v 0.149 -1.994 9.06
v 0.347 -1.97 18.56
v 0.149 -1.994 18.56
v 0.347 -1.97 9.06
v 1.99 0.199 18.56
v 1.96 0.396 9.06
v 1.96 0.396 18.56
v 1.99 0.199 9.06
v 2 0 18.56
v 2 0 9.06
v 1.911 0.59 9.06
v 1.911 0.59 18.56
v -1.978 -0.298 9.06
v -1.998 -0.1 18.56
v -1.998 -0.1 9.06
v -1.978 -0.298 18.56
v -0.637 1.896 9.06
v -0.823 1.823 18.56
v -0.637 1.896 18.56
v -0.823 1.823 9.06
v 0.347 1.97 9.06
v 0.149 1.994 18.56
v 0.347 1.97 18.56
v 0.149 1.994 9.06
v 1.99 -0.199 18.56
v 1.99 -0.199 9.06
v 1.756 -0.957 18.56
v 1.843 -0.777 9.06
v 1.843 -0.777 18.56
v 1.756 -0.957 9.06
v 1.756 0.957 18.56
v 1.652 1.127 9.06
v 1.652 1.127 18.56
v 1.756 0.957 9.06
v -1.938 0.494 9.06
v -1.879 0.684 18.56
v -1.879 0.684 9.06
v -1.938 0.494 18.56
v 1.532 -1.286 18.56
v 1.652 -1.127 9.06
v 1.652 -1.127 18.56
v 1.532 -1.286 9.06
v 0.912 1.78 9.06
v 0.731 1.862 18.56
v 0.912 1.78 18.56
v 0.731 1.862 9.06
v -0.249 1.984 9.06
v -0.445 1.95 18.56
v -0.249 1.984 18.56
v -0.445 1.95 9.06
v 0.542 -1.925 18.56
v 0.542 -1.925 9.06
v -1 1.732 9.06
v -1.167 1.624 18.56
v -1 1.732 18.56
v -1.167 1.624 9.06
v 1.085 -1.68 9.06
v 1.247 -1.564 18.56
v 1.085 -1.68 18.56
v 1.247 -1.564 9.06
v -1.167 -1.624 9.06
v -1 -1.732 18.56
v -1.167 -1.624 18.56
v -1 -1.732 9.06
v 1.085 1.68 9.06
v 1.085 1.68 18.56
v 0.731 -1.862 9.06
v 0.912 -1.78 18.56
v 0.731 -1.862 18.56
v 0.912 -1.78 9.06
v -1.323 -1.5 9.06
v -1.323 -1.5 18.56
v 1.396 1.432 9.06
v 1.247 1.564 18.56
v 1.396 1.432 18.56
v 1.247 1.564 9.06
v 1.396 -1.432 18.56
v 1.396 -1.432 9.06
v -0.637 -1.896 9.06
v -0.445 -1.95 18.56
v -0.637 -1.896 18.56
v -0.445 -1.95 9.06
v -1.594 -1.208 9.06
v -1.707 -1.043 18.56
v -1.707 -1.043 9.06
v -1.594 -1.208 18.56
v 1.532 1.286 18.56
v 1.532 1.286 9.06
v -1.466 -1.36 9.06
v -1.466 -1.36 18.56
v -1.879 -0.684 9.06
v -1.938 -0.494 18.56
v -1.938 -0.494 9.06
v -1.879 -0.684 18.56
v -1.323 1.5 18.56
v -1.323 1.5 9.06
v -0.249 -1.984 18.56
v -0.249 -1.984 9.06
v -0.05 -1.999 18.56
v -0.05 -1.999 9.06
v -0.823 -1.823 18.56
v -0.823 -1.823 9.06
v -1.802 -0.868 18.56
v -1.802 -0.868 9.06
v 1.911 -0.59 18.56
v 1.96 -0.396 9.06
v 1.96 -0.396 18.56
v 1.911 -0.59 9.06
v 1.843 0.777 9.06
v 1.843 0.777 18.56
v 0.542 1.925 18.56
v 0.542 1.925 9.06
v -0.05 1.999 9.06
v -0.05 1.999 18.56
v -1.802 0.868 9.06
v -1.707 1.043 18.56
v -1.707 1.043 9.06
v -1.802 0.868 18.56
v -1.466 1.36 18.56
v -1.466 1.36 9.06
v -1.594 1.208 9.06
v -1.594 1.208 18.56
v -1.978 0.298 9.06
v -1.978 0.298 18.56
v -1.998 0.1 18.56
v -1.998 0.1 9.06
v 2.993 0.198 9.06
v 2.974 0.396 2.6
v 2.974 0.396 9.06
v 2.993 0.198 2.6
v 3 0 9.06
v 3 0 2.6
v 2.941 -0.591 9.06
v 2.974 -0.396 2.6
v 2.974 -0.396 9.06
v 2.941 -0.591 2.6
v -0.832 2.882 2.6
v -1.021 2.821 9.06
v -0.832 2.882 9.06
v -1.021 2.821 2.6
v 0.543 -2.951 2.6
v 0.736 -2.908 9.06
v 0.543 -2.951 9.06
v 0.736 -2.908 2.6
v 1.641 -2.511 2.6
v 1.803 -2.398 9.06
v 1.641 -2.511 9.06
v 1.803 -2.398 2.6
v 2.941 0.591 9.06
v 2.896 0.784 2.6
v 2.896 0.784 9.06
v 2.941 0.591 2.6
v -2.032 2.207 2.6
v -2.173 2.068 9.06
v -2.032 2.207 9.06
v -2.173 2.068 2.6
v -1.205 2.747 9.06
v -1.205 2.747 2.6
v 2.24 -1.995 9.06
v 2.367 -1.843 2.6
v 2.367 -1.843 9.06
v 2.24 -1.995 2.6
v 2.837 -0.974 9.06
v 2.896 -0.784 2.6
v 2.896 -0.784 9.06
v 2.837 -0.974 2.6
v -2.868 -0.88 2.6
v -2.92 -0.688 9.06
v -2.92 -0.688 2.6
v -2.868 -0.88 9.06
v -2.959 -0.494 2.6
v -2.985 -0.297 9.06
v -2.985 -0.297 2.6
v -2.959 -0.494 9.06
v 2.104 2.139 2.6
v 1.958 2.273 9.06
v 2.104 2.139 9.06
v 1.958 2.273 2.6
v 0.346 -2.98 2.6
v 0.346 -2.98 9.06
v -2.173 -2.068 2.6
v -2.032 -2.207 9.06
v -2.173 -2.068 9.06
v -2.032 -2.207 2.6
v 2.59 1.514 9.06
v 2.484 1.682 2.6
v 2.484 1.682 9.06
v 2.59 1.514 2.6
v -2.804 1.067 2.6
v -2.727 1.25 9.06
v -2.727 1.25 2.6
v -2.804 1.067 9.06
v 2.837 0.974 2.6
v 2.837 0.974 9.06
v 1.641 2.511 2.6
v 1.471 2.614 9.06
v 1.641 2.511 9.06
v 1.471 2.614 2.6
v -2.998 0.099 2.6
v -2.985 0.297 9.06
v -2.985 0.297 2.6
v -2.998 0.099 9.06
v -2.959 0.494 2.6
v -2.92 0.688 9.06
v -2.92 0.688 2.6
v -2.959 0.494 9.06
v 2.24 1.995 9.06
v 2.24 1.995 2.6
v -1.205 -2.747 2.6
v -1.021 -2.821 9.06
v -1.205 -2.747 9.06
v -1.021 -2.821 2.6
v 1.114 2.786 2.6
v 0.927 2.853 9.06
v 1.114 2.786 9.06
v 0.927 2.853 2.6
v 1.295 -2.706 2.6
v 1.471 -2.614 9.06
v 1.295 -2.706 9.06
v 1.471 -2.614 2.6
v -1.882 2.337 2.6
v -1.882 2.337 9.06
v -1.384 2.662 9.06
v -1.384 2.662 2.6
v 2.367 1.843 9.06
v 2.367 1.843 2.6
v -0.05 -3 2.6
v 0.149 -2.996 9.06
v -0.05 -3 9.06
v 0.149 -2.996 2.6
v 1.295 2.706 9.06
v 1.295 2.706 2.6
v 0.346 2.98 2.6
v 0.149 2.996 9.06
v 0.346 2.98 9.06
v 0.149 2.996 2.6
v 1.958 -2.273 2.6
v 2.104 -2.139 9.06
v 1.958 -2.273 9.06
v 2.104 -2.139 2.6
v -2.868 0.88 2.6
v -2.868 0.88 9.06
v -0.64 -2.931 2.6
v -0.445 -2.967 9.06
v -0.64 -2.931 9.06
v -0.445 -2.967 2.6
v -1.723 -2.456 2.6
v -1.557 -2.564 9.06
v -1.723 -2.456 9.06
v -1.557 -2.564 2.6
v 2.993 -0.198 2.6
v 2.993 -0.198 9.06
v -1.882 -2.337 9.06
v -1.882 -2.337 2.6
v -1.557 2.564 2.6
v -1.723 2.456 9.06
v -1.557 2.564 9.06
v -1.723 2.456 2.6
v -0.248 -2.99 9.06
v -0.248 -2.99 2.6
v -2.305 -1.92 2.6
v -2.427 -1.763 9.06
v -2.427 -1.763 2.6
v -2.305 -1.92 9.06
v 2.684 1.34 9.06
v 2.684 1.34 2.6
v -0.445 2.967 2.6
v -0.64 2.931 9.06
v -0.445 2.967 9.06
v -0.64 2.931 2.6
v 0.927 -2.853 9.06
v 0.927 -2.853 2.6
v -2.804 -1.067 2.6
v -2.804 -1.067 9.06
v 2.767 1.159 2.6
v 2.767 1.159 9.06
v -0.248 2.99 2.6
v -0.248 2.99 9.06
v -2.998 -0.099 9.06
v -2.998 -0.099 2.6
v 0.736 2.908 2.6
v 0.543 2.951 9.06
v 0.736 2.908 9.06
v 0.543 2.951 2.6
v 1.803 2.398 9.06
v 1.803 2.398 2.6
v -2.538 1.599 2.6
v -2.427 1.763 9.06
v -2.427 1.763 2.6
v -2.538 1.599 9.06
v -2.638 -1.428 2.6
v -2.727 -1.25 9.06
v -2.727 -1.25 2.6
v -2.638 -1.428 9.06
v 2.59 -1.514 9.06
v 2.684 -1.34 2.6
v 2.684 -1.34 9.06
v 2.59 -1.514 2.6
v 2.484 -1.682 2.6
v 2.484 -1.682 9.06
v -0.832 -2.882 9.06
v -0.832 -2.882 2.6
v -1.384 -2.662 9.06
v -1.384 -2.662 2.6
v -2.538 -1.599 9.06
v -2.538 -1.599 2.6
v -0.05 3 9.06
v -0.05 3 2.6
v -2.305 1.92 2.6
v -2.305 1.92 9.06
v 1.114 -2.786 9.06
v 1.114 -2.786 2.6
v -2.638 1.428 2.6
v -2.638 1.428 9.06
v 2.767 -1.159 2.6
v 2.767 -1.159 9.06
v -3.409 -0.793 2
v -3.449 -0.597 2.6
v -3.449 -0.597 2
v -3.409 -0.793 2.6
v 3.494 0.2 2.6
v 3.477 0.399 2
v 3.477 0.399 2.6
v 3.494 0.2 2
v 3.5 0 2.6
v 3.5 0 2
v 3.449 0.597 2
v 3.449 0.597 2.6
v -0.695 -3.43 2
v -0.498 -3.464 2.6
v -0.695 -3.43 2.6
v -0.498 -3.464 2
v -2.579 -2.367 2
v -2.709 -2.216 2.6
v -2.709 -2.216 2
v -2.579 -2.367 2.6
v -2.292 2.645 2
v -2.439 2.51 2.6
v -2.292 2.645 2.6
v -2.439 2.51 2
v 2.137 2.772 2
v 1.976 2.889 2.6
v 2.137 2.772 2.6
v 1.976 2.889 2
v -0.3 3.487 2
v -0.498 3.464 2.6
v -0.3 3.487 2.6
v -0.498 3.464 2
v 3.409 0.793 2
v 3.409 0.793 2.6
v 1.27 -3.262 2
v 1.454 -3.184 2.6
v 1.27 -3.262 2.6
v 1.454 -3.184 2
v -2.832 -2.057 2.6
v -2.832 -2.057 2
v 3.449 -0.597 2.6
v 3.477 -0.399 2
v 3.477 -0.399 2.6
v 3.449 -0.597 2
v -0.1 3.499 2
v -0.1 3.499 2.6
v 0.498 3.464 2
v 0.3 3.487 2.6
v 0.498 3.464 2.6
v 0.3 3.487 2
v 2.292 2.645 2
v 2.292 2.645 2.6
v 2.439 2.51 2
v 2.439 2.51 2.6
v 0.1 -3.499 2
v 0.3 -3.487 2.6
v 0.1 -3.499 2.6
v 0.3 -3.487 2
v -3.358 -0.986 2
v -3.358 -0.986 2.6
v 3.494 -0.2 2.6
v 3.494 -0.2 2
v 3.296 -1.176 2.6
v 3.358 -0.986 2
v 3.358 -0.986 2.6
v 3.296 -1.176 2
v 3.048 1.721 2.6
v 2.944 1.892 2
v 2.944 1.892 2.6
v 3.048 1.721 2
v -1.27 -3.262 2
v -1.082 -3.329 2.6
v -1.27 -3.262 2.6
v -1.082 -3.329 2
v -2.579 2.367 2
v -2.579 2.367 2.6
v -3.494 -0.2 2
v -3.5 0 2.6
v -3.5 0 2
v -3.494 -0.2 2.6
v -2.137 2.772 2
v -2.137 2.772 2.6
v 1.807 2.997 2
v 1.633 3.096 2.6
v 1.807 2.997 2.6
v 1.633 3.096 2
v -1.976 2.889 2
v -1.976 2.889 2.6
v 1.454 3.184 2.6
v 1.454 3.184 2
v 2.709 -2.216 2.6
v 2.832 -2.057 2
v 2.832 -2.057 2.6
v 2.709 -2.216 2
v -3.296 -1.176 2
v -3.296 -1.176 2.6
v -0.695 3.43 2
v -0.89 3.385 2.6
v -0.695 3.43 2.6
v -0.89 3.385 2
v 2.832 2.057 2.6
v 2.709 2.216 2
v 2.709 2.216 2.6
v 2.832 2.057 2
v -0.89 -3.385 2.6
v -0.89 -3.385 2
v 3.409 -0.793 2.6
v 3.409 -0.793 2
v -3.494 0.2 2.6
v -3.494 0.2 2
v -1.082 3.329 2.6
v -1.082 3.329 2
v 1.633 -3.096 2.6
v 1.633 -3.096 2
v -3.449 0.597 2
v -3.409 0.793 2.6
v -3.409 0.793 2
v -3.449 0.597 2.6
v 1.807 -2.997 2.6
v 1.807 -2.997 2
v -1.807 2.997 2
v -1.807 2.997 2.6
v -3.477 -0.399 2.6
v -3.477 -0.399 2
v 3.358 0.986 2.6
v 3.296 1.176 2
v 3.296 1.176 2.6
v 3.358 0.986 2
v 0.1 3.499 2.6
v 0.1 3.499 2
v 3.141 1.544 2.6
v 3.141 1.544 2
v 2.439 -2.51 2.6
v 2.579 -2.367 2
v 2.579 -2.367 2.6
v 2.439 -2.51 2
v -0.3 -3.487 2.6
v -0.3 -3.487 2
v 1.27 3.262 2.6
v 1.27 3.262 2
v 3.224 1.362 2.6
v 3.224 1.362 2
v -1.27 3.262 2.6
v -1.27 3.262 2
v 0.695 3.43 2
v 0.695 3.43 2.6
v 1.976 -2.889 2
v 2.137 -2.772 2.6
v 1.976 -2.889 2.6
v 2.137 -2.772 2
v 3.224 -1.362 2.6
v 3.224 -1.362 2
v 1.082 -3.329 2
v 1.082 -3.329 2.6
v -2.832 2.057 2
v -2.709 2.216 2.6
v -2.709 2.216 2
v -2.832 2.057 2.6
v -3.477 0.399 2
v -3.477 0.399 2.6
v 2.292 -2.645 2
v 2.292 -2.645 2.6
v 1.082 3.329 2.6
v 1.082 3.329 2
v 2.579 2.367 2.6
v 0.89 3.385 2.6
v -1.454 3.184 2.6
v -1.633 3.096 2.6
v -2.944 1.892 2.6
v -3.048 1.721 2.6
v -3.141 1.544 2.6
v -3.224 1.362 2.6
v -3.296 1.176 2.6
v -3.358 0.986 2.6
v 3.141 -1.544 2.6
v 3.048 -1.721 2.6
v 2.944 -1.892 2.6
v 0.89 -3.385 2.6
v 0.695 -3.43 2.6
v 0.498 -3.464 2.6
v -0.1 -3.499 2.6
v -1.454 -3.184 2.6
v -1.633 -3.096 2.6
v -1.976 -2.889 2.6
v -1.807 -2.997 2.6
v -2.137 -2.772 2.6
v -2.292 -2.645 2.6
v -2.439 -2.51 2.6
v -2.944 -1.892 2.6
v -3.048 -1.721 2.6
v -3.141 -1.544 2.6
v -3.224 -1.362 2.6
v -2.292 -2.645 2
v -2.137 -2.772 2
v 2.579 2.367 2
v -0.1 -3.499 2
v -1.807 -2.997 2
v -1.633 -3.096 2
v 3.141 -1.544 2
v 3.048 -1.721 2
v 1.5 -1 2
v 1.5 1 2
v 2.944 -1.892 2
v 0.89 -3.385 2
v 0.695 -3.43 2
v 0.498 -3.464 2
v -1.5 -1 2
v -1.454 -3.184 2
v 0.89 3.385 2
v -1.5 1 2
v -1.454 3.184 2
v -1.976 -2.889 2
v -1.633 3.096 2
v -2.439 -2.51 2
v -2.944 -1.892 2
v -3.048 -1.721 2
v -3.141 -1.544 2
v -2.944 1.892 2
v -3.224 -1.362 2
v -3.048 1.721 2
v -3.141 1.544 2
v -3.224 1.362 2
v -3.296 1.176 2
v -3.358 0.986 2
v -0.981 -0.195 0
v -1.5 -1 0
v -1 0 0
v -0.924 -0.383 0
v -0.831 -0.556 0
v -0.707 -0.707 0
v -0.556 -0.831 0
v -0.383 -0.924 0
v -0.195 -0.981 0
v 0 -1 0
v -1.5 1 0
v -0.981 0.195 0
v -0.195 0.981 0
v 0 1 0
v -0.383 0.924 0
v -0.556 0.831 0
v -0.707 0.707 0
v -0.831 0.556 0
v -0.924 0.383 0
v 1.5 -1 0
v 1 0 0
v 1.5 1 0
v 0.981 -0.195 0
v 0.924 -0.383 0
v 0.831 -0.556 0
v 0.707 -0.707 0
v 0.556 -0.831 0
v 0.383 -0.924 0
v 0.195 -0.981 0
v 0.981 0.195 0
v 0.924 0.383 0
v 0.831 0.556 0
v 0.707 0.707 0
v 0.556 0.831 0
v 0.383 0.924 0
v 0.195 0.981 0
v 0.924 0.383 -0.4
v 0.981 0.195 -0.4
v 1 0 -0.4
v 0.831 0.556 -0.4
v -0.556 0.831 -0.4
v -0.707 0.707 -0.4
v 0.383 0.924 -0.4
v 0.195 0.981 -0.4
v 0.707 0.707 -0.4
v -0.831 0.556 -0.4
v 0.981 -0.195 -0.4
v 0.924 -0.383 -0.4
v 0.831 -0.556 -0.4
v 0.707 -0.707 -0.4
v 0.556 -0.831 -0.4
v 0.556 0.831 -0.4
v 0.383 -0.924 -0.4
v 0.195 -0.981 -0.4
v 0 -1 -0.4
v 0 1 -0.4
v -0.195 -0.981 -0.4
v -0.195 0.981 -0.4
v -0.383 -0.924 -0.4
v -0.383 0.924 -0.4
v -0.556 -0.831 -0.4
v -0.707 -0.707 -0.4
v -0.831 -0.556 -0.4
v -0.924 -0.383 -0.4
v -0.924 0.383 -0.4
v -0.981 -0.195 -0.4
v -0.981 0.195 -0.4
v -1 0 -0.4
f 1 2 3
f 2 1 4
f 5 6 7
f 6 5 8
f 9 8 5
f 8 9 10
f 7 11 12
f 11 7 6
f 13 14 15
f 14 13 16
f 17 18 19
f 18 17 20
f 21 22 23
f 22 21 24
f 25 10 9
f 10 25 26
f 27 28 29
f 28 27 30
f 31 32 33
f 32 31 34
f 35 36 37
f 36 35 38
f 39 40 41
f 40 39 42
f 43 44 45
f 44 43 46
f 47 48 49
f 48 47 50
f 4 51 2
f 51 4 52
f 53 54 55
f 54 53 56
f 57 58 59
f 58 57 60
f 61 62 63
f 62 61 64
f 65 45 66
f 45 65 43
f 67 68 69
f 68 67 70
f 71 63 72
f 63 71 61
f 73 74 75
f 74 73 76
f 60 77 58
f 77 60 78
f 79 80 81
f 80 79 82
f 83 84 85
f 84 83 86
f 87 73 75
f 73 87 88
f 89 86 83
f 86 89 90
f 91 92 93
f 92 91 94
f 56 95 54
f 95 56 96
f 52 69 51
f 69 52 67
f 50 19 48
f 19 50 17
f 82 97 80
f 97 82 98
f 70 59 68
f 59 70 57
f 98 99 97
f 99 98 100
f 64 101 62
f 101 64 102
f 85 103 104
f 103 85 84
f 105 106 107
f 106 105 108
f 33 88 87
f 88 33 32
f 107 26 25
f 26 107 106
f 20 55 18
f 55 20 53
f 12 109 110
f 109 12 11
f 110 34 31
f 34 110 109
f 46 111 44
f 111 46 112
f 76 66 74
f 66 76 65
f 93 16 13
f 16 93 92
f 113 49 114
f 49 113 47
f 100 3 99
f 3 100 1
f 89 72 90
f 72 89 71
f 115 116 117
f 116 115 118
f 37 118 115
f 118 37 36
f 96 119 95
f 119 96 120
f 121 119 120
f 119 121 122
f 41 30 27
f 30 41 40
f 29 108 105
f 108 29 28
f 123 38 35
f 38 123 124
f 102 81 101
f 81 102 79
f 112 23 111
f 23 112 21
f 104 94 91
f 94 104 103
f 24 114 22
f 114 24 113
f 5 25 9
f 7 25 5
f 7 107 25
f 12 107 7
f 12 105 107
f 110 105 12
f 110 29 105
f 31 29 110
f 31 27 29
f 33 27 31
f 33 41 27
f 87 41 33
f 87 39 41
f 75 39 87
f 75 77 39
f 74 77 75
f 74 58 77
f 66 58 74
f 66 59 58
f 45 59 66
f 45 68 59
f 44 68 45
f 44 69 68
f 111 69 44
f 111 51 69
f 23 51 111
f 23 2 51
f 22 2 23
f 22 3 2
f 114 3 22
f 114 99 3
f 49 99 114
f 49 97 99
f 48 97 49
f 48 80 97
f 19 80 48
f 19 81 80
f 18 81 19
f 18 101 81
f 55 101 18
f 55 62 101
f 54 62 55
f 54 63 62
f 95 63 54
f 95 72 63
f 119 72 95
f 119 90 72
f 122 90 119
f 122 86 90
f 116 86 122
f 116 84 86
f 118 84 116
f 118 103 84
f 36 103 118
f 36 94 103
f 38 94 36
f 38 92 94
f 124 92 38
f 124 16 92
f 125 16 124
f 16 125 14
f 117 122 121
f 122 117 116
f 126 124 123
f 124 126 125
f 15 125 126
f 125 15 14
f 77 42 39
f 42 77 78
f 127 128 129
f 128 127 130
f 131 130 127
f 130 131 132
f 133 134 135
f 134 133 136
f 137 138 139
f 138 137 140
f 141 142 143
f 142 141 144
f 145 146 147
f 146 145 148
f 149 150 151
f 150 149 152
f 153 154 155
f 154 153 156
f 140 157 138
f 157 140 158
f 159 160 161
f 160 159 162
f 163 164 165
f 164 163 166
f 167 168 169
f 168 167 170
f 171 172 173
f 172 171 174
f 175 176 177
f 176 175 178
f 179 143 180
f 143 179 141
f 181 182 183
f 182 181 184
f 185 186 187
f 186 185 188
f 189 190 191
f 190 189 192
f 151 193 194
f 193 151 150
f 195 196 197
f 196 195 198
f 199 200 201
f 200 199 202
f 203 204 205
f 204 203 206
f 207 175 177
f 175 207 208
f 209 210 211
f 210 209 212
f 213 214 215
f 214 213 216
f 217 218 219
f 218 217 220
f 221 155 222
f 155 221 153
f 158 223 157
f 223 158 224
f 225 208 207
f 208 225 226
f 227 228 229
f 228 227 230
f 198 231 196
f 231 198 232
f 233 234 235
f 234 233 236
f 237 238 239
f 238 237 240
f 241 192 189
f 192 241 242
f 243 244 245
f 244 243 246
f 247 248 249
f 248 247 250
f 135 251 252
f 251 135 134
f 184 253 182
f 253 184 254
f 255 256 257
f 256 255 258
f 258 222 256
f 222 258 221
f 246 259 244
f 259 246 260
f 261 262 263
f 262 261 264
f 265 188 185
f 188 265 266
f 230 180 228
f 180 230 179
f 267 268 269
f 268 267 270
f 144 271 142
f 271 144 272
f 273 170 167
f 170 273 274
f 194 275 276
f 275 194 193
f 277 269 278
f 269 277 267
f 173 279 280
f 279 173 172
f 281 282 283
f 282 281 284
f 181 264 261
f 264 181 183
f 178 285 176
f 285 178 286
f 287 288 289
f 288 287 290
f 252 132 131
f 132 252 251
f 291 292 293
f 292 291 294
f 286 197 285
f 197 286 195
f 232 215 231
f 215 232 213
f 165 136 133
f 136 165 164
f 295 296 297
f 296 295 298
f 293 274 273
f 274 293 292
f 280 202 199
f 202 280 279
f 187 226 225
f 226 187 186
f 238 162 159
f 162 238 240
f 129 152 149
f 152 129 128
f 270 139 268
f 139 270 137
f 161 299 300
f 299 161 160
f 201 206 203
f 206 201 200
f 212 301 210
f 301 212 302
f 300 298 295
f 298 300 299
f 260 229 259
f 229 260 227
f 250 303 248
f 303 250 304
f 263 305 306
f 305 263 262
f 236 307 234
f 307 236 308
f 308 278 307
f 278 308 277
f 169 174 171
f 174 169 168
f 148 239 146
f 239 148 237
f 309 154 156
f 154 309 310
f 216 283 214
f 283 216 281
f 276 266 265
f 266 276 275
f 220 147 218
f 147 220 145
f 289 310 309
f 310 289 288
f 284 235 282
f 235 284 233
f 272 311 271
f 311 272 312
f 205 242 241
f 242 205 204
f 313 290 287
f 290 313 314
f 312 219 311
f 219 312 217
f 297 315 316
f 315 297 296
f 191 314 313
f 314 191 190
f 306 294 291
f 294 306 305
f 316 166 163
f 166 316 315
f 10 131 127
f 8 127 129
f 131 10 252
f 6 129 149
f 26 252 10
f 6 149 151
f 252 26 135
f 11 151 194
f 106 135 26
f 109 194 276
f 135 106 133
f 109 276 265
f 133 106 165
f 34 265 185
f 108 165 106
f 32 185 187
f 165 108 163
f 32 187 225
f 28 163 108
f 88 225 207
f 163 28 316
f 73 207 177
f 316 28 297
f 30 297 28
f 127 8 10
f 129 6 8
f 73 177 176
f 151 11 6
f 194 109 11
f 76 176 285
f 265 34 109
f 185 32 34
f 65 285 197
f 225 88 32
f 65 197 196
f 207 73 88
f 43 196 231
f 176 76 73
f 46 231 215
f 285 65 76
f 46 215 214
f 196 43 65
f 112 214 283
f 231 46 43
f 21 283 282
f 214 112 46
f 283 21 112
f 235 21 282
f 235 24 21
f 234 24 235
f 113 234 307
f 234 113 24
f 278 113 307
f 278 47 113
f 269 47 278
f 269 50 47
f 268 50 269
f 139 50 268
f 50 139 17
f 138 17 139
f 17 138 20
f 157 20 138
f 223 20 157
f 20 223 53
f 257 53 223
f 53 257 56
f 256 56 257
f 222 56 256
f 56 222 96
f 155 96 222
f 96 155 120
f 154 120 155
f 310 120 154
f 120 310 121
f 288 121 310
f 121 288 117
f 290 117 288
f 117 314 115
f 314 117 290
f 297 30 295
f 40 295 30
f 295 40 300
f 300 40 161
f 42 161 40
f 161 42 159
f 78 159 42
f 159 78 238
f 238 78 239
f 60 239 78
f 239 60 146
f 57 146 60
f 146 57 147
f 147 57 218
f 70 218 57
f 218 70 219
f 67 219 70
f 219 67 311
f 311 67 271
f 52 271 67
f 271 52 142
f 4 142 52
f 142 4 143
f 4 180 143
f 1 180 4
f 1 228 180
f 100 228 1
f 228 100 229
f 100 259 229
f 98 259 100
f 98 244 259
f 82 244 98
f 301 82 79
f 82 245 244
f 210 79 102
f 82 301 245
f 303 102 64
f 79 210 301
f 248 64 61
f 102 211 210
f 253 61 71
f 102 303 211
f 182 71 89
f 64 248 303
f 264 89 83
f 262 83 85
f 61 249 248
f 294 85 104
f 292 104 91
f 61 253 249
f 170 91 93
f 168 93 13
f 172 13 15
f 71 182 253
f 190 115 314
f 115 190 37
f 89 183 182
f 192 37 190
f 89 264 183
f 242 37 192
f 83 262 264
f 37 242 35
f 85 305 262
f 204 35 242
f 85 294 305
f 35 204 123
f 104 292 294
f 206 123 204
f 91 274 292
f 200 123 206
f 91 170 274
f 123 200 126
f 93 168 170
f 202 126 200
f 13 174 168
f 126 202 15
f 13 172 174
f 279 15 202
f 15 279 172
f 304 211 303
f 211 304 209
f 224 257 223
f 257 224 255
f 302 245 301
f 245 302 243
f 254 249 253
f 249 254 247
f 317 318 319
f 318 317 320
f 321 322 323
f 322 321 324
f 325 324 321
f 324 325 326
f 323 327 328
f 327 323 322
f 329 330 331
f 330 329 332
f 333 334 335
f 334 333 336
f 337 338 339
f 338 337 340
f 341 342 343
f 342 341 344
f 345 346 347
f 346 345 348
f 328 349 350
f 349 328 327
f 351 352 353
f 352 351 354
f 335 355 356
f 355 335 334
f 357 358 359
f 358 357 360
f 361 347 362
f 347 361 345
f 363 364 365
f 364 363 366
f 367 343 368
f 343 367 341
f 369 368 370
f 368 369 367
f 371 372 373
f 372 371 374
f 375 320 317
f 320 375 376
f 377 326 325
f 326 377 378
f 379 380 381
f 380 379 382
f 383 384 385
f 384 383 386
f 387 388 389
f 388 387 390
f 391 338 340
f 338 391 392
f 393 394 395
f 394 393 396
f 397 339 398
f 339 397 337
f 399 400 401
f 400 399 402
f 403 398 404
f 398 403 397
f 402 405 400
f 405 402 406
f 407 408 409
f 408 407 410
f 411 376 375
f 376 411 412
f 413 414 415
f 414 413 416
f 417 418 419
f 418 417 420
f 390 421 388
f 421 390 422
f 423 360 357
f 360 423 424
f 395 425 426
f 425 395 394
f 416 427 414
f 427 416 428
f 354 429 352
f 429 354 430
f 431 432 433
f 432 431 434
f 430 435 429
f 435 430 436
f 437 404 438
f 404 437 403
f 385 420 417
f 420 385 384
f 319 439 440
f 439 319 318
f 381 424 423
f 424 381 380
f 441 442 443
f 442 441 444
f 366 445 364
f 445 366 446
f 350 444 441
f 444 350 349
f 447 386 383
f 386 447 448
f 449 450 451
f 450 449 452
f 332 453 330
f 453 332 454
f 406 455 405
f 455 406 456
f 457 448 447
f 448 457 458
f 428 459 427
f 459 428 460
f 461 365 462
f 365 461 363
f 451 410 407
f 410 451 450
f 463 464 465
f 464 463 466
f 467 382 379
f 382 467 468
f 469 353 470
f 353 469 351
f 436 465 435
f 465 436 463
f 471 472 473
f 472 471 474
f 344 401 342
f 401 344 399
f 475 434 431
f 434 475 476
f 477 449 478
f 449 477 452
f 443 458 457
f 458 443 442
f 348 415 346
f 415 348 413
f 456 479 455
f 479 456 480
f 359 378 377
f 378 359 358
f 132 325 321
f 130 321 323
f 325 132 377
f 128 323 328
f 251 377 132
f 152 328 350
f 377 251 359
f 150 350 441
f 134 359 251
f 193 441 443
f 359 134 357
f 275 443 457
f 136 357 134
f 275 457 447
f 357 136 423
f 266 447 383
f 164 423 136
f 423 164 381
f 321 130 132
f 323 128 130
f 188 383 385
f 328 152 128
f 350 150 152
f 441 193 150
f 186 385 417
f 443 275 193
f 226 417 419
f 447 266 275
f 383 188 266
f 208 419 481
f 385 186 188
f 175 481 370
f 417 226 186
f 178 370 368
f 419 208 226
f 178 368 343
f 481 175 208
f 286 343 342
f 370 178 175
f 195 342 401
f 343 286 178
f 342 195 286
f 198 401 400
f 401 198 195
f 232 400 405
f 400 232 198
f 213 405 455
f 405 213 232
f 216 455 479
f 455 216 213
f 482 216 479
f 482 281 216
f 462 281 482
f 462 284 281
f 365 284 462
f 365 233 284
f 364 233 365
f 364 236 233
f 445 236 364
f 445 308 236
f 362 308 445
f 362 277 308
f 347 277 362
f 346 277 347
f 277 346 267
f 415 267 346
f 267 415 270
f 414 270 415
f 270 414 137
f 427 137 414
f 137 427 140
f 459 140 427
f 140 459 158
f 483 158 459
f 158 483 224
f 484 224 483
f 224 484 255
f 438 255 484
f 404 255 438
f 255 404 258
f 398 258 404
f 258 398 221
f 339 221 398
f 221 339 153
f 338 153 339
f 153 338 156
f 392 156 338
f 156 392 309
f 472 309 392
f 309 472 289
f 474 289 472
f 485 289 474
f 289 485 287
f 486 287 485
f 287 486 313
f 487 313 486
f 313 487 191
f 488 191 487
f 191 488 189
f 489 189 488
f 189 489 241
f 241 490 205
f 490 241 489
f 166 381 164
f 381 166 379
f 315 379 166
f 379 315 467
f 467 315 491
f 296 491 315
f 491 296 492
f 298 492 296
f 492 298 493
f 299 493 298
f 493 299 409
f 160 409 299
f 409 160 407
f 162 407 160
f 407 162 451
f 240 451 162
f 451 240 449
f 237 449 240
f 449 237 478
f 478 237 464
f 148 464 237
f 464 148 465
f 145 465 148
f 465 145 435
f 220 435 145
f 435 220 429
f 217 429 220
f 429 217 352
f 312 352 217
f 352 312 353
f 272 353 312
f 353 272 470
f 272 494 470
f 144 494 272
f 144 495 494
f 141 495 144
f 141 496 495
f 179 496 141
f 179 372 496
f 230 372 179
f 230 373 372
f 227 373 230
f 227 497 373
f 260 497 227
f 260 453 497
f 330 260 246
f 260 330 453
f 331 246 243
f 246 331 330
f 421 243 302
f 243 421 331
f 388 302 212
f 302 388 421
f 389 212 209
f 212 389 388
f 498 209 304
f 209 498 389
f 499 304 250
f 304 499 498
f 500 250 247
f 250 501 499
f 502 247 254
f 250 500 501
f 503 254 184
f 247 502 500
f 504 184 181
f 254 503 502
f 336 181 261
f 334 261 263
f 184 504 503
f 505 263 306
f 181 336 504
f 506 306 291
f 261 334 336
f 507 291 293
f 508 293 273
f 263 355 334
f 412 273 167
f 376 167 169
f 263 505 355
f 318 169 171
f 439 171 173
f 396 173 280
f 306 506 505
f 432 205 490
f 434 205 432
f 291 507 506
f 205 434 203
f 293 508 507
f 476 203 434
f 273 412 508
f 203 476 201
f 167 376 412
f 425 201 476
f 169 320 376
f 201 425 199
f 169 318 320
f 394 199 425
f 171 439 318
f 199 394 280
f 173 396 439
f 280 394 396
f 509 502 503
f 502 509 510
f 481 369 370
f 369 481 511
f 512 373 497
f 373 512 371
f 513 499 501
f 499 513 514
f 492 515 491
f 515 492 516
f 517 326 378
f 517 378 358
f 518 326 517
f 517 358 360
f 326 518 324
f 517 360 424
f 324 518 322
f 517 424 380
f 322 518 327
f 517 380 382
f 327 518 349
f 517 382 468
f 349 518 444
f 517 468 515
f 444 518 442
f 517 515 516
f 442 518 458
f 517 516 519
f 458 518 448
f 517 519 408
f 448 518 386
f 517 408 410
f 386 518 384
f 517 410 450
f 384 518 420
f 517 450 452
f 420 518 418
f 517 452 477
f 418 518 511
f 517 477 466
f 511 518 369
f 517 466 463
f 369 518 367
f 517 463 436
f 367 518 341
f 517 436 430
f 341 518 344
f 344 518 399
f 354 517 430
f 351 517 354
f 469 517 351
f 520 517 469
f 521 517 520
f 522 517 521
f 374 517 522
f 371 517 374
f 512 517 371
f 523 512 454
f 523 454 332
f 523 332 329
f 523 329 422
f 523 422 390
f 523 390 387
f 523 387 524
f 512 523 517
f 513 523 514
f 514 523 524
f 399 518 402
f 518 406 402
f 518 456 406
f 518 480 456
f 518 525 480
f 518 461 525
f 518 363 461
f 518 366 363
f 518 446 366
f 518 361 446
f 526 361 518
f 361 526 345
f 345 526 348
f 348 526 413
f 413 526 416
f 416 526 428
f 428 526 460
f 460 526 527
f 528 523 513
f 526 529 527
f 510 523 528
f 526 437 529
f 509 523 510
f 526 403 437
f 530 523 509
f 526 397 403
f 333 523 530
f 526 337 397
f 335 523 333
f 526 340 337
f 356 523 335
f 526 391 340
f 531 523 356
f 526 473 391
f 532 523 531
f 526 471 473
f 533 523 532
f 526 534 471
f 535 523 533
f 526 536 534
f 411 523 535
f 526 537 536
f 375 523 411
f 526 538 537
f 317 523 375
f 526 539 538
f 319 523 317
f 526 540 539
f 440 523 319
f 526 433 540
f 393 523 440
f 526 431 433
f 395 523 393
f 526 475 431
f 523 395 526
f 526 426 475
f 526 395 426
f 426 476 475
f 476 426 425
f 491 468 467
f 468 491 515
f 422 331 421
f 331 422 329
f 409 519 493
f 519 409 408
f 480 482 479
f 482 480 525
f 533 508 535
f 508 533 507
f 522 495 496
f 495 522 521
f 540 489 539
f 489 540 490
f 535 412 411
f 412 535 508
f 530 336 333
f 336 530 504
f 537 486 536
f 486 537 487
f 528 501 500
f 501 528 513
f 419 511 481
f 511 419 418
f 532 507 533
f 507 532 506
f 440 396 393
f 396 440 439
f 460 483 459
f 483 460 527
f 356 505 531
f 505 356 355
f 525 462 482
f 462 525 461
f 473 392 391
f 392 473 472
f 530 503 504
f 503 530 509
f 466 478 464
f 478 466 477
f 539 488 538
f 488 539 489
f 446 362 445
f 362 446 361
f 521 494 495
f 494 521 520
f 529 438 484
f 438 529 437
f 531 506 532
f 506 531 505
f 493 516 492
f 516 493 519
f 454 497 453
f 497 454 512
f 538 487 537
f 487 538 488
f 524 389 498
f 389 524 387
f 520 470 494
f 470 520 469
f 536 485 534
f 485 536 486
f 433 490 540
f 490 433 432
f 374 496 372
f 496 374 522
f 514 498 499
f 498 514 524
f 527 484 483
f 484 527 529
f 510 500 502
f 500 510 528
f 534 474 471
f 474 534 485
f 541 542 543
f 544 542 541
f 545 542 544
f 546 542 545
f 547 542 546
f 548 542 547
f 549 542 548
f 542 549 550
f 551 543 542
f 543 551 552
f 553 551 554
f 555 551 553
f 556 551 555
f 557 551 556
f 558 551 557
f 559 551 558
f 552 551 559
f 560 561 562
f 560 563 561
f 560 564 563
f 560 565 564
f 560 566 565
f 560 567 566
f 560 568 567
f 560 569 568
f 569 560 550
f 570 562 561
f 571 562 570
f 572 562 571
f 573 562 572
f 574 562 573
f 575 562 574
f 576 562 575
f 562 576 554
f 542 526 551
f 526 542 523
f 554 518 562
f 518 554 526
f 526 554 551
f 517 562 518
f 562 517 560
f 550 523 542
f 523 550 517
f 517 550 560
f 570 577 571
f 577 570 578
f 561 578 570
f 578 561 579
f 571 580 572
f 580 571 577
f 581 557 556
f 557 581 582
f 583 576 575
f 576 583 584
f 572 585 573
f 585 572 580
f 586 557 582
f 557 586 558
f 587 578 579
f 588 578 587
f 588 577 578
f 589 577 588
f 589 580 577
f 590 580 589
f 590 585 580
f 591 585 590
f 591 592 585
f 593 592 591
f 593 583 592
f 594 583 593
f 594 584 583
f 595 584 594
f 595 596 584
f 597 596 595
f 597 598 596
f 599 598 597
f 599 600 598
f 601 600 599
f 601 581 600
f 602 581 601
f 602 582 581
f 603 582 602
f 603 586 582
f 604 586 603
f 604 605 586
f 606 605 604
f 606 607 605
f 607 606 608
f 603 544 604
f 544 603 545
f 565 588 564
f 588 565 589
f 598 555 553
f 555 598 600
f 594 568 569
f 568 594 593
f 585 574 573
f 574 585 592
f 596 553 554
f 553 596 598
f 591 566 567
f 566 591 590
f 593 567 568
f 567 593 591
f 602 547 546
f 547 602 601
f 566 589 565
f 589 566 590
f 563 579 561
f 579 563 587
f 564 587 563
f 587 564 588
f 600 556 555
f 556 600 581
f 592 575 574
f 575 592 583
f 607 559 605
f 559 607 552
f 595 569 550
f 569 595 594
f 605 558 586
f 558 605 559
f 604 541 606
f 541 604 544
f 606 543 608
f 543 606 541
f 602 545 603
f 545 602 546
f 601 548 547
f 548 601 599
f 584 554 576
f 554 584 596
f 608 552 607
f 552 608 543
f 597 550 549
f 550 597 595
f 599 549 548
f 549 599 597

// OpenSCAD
$fa = 1;
$fs = 0.2;

translate([0,0,9.06+7/2]) cylinder(h=12, r=2, center=true);
translate([0,0,2.06+7/2]) cylinder(h=7, r=3, center=true);
translate([0,0,2+0.6/2]) cylinder(h=0.6, r=3.5, center=true);
// subtract cutout for buttons
translate([0,0,0]) linear_extrude(height=2) square([3,2], center=true);
translate([0,0,-0.4/2]) cylinder(h=0.4, r=1, center=true);
